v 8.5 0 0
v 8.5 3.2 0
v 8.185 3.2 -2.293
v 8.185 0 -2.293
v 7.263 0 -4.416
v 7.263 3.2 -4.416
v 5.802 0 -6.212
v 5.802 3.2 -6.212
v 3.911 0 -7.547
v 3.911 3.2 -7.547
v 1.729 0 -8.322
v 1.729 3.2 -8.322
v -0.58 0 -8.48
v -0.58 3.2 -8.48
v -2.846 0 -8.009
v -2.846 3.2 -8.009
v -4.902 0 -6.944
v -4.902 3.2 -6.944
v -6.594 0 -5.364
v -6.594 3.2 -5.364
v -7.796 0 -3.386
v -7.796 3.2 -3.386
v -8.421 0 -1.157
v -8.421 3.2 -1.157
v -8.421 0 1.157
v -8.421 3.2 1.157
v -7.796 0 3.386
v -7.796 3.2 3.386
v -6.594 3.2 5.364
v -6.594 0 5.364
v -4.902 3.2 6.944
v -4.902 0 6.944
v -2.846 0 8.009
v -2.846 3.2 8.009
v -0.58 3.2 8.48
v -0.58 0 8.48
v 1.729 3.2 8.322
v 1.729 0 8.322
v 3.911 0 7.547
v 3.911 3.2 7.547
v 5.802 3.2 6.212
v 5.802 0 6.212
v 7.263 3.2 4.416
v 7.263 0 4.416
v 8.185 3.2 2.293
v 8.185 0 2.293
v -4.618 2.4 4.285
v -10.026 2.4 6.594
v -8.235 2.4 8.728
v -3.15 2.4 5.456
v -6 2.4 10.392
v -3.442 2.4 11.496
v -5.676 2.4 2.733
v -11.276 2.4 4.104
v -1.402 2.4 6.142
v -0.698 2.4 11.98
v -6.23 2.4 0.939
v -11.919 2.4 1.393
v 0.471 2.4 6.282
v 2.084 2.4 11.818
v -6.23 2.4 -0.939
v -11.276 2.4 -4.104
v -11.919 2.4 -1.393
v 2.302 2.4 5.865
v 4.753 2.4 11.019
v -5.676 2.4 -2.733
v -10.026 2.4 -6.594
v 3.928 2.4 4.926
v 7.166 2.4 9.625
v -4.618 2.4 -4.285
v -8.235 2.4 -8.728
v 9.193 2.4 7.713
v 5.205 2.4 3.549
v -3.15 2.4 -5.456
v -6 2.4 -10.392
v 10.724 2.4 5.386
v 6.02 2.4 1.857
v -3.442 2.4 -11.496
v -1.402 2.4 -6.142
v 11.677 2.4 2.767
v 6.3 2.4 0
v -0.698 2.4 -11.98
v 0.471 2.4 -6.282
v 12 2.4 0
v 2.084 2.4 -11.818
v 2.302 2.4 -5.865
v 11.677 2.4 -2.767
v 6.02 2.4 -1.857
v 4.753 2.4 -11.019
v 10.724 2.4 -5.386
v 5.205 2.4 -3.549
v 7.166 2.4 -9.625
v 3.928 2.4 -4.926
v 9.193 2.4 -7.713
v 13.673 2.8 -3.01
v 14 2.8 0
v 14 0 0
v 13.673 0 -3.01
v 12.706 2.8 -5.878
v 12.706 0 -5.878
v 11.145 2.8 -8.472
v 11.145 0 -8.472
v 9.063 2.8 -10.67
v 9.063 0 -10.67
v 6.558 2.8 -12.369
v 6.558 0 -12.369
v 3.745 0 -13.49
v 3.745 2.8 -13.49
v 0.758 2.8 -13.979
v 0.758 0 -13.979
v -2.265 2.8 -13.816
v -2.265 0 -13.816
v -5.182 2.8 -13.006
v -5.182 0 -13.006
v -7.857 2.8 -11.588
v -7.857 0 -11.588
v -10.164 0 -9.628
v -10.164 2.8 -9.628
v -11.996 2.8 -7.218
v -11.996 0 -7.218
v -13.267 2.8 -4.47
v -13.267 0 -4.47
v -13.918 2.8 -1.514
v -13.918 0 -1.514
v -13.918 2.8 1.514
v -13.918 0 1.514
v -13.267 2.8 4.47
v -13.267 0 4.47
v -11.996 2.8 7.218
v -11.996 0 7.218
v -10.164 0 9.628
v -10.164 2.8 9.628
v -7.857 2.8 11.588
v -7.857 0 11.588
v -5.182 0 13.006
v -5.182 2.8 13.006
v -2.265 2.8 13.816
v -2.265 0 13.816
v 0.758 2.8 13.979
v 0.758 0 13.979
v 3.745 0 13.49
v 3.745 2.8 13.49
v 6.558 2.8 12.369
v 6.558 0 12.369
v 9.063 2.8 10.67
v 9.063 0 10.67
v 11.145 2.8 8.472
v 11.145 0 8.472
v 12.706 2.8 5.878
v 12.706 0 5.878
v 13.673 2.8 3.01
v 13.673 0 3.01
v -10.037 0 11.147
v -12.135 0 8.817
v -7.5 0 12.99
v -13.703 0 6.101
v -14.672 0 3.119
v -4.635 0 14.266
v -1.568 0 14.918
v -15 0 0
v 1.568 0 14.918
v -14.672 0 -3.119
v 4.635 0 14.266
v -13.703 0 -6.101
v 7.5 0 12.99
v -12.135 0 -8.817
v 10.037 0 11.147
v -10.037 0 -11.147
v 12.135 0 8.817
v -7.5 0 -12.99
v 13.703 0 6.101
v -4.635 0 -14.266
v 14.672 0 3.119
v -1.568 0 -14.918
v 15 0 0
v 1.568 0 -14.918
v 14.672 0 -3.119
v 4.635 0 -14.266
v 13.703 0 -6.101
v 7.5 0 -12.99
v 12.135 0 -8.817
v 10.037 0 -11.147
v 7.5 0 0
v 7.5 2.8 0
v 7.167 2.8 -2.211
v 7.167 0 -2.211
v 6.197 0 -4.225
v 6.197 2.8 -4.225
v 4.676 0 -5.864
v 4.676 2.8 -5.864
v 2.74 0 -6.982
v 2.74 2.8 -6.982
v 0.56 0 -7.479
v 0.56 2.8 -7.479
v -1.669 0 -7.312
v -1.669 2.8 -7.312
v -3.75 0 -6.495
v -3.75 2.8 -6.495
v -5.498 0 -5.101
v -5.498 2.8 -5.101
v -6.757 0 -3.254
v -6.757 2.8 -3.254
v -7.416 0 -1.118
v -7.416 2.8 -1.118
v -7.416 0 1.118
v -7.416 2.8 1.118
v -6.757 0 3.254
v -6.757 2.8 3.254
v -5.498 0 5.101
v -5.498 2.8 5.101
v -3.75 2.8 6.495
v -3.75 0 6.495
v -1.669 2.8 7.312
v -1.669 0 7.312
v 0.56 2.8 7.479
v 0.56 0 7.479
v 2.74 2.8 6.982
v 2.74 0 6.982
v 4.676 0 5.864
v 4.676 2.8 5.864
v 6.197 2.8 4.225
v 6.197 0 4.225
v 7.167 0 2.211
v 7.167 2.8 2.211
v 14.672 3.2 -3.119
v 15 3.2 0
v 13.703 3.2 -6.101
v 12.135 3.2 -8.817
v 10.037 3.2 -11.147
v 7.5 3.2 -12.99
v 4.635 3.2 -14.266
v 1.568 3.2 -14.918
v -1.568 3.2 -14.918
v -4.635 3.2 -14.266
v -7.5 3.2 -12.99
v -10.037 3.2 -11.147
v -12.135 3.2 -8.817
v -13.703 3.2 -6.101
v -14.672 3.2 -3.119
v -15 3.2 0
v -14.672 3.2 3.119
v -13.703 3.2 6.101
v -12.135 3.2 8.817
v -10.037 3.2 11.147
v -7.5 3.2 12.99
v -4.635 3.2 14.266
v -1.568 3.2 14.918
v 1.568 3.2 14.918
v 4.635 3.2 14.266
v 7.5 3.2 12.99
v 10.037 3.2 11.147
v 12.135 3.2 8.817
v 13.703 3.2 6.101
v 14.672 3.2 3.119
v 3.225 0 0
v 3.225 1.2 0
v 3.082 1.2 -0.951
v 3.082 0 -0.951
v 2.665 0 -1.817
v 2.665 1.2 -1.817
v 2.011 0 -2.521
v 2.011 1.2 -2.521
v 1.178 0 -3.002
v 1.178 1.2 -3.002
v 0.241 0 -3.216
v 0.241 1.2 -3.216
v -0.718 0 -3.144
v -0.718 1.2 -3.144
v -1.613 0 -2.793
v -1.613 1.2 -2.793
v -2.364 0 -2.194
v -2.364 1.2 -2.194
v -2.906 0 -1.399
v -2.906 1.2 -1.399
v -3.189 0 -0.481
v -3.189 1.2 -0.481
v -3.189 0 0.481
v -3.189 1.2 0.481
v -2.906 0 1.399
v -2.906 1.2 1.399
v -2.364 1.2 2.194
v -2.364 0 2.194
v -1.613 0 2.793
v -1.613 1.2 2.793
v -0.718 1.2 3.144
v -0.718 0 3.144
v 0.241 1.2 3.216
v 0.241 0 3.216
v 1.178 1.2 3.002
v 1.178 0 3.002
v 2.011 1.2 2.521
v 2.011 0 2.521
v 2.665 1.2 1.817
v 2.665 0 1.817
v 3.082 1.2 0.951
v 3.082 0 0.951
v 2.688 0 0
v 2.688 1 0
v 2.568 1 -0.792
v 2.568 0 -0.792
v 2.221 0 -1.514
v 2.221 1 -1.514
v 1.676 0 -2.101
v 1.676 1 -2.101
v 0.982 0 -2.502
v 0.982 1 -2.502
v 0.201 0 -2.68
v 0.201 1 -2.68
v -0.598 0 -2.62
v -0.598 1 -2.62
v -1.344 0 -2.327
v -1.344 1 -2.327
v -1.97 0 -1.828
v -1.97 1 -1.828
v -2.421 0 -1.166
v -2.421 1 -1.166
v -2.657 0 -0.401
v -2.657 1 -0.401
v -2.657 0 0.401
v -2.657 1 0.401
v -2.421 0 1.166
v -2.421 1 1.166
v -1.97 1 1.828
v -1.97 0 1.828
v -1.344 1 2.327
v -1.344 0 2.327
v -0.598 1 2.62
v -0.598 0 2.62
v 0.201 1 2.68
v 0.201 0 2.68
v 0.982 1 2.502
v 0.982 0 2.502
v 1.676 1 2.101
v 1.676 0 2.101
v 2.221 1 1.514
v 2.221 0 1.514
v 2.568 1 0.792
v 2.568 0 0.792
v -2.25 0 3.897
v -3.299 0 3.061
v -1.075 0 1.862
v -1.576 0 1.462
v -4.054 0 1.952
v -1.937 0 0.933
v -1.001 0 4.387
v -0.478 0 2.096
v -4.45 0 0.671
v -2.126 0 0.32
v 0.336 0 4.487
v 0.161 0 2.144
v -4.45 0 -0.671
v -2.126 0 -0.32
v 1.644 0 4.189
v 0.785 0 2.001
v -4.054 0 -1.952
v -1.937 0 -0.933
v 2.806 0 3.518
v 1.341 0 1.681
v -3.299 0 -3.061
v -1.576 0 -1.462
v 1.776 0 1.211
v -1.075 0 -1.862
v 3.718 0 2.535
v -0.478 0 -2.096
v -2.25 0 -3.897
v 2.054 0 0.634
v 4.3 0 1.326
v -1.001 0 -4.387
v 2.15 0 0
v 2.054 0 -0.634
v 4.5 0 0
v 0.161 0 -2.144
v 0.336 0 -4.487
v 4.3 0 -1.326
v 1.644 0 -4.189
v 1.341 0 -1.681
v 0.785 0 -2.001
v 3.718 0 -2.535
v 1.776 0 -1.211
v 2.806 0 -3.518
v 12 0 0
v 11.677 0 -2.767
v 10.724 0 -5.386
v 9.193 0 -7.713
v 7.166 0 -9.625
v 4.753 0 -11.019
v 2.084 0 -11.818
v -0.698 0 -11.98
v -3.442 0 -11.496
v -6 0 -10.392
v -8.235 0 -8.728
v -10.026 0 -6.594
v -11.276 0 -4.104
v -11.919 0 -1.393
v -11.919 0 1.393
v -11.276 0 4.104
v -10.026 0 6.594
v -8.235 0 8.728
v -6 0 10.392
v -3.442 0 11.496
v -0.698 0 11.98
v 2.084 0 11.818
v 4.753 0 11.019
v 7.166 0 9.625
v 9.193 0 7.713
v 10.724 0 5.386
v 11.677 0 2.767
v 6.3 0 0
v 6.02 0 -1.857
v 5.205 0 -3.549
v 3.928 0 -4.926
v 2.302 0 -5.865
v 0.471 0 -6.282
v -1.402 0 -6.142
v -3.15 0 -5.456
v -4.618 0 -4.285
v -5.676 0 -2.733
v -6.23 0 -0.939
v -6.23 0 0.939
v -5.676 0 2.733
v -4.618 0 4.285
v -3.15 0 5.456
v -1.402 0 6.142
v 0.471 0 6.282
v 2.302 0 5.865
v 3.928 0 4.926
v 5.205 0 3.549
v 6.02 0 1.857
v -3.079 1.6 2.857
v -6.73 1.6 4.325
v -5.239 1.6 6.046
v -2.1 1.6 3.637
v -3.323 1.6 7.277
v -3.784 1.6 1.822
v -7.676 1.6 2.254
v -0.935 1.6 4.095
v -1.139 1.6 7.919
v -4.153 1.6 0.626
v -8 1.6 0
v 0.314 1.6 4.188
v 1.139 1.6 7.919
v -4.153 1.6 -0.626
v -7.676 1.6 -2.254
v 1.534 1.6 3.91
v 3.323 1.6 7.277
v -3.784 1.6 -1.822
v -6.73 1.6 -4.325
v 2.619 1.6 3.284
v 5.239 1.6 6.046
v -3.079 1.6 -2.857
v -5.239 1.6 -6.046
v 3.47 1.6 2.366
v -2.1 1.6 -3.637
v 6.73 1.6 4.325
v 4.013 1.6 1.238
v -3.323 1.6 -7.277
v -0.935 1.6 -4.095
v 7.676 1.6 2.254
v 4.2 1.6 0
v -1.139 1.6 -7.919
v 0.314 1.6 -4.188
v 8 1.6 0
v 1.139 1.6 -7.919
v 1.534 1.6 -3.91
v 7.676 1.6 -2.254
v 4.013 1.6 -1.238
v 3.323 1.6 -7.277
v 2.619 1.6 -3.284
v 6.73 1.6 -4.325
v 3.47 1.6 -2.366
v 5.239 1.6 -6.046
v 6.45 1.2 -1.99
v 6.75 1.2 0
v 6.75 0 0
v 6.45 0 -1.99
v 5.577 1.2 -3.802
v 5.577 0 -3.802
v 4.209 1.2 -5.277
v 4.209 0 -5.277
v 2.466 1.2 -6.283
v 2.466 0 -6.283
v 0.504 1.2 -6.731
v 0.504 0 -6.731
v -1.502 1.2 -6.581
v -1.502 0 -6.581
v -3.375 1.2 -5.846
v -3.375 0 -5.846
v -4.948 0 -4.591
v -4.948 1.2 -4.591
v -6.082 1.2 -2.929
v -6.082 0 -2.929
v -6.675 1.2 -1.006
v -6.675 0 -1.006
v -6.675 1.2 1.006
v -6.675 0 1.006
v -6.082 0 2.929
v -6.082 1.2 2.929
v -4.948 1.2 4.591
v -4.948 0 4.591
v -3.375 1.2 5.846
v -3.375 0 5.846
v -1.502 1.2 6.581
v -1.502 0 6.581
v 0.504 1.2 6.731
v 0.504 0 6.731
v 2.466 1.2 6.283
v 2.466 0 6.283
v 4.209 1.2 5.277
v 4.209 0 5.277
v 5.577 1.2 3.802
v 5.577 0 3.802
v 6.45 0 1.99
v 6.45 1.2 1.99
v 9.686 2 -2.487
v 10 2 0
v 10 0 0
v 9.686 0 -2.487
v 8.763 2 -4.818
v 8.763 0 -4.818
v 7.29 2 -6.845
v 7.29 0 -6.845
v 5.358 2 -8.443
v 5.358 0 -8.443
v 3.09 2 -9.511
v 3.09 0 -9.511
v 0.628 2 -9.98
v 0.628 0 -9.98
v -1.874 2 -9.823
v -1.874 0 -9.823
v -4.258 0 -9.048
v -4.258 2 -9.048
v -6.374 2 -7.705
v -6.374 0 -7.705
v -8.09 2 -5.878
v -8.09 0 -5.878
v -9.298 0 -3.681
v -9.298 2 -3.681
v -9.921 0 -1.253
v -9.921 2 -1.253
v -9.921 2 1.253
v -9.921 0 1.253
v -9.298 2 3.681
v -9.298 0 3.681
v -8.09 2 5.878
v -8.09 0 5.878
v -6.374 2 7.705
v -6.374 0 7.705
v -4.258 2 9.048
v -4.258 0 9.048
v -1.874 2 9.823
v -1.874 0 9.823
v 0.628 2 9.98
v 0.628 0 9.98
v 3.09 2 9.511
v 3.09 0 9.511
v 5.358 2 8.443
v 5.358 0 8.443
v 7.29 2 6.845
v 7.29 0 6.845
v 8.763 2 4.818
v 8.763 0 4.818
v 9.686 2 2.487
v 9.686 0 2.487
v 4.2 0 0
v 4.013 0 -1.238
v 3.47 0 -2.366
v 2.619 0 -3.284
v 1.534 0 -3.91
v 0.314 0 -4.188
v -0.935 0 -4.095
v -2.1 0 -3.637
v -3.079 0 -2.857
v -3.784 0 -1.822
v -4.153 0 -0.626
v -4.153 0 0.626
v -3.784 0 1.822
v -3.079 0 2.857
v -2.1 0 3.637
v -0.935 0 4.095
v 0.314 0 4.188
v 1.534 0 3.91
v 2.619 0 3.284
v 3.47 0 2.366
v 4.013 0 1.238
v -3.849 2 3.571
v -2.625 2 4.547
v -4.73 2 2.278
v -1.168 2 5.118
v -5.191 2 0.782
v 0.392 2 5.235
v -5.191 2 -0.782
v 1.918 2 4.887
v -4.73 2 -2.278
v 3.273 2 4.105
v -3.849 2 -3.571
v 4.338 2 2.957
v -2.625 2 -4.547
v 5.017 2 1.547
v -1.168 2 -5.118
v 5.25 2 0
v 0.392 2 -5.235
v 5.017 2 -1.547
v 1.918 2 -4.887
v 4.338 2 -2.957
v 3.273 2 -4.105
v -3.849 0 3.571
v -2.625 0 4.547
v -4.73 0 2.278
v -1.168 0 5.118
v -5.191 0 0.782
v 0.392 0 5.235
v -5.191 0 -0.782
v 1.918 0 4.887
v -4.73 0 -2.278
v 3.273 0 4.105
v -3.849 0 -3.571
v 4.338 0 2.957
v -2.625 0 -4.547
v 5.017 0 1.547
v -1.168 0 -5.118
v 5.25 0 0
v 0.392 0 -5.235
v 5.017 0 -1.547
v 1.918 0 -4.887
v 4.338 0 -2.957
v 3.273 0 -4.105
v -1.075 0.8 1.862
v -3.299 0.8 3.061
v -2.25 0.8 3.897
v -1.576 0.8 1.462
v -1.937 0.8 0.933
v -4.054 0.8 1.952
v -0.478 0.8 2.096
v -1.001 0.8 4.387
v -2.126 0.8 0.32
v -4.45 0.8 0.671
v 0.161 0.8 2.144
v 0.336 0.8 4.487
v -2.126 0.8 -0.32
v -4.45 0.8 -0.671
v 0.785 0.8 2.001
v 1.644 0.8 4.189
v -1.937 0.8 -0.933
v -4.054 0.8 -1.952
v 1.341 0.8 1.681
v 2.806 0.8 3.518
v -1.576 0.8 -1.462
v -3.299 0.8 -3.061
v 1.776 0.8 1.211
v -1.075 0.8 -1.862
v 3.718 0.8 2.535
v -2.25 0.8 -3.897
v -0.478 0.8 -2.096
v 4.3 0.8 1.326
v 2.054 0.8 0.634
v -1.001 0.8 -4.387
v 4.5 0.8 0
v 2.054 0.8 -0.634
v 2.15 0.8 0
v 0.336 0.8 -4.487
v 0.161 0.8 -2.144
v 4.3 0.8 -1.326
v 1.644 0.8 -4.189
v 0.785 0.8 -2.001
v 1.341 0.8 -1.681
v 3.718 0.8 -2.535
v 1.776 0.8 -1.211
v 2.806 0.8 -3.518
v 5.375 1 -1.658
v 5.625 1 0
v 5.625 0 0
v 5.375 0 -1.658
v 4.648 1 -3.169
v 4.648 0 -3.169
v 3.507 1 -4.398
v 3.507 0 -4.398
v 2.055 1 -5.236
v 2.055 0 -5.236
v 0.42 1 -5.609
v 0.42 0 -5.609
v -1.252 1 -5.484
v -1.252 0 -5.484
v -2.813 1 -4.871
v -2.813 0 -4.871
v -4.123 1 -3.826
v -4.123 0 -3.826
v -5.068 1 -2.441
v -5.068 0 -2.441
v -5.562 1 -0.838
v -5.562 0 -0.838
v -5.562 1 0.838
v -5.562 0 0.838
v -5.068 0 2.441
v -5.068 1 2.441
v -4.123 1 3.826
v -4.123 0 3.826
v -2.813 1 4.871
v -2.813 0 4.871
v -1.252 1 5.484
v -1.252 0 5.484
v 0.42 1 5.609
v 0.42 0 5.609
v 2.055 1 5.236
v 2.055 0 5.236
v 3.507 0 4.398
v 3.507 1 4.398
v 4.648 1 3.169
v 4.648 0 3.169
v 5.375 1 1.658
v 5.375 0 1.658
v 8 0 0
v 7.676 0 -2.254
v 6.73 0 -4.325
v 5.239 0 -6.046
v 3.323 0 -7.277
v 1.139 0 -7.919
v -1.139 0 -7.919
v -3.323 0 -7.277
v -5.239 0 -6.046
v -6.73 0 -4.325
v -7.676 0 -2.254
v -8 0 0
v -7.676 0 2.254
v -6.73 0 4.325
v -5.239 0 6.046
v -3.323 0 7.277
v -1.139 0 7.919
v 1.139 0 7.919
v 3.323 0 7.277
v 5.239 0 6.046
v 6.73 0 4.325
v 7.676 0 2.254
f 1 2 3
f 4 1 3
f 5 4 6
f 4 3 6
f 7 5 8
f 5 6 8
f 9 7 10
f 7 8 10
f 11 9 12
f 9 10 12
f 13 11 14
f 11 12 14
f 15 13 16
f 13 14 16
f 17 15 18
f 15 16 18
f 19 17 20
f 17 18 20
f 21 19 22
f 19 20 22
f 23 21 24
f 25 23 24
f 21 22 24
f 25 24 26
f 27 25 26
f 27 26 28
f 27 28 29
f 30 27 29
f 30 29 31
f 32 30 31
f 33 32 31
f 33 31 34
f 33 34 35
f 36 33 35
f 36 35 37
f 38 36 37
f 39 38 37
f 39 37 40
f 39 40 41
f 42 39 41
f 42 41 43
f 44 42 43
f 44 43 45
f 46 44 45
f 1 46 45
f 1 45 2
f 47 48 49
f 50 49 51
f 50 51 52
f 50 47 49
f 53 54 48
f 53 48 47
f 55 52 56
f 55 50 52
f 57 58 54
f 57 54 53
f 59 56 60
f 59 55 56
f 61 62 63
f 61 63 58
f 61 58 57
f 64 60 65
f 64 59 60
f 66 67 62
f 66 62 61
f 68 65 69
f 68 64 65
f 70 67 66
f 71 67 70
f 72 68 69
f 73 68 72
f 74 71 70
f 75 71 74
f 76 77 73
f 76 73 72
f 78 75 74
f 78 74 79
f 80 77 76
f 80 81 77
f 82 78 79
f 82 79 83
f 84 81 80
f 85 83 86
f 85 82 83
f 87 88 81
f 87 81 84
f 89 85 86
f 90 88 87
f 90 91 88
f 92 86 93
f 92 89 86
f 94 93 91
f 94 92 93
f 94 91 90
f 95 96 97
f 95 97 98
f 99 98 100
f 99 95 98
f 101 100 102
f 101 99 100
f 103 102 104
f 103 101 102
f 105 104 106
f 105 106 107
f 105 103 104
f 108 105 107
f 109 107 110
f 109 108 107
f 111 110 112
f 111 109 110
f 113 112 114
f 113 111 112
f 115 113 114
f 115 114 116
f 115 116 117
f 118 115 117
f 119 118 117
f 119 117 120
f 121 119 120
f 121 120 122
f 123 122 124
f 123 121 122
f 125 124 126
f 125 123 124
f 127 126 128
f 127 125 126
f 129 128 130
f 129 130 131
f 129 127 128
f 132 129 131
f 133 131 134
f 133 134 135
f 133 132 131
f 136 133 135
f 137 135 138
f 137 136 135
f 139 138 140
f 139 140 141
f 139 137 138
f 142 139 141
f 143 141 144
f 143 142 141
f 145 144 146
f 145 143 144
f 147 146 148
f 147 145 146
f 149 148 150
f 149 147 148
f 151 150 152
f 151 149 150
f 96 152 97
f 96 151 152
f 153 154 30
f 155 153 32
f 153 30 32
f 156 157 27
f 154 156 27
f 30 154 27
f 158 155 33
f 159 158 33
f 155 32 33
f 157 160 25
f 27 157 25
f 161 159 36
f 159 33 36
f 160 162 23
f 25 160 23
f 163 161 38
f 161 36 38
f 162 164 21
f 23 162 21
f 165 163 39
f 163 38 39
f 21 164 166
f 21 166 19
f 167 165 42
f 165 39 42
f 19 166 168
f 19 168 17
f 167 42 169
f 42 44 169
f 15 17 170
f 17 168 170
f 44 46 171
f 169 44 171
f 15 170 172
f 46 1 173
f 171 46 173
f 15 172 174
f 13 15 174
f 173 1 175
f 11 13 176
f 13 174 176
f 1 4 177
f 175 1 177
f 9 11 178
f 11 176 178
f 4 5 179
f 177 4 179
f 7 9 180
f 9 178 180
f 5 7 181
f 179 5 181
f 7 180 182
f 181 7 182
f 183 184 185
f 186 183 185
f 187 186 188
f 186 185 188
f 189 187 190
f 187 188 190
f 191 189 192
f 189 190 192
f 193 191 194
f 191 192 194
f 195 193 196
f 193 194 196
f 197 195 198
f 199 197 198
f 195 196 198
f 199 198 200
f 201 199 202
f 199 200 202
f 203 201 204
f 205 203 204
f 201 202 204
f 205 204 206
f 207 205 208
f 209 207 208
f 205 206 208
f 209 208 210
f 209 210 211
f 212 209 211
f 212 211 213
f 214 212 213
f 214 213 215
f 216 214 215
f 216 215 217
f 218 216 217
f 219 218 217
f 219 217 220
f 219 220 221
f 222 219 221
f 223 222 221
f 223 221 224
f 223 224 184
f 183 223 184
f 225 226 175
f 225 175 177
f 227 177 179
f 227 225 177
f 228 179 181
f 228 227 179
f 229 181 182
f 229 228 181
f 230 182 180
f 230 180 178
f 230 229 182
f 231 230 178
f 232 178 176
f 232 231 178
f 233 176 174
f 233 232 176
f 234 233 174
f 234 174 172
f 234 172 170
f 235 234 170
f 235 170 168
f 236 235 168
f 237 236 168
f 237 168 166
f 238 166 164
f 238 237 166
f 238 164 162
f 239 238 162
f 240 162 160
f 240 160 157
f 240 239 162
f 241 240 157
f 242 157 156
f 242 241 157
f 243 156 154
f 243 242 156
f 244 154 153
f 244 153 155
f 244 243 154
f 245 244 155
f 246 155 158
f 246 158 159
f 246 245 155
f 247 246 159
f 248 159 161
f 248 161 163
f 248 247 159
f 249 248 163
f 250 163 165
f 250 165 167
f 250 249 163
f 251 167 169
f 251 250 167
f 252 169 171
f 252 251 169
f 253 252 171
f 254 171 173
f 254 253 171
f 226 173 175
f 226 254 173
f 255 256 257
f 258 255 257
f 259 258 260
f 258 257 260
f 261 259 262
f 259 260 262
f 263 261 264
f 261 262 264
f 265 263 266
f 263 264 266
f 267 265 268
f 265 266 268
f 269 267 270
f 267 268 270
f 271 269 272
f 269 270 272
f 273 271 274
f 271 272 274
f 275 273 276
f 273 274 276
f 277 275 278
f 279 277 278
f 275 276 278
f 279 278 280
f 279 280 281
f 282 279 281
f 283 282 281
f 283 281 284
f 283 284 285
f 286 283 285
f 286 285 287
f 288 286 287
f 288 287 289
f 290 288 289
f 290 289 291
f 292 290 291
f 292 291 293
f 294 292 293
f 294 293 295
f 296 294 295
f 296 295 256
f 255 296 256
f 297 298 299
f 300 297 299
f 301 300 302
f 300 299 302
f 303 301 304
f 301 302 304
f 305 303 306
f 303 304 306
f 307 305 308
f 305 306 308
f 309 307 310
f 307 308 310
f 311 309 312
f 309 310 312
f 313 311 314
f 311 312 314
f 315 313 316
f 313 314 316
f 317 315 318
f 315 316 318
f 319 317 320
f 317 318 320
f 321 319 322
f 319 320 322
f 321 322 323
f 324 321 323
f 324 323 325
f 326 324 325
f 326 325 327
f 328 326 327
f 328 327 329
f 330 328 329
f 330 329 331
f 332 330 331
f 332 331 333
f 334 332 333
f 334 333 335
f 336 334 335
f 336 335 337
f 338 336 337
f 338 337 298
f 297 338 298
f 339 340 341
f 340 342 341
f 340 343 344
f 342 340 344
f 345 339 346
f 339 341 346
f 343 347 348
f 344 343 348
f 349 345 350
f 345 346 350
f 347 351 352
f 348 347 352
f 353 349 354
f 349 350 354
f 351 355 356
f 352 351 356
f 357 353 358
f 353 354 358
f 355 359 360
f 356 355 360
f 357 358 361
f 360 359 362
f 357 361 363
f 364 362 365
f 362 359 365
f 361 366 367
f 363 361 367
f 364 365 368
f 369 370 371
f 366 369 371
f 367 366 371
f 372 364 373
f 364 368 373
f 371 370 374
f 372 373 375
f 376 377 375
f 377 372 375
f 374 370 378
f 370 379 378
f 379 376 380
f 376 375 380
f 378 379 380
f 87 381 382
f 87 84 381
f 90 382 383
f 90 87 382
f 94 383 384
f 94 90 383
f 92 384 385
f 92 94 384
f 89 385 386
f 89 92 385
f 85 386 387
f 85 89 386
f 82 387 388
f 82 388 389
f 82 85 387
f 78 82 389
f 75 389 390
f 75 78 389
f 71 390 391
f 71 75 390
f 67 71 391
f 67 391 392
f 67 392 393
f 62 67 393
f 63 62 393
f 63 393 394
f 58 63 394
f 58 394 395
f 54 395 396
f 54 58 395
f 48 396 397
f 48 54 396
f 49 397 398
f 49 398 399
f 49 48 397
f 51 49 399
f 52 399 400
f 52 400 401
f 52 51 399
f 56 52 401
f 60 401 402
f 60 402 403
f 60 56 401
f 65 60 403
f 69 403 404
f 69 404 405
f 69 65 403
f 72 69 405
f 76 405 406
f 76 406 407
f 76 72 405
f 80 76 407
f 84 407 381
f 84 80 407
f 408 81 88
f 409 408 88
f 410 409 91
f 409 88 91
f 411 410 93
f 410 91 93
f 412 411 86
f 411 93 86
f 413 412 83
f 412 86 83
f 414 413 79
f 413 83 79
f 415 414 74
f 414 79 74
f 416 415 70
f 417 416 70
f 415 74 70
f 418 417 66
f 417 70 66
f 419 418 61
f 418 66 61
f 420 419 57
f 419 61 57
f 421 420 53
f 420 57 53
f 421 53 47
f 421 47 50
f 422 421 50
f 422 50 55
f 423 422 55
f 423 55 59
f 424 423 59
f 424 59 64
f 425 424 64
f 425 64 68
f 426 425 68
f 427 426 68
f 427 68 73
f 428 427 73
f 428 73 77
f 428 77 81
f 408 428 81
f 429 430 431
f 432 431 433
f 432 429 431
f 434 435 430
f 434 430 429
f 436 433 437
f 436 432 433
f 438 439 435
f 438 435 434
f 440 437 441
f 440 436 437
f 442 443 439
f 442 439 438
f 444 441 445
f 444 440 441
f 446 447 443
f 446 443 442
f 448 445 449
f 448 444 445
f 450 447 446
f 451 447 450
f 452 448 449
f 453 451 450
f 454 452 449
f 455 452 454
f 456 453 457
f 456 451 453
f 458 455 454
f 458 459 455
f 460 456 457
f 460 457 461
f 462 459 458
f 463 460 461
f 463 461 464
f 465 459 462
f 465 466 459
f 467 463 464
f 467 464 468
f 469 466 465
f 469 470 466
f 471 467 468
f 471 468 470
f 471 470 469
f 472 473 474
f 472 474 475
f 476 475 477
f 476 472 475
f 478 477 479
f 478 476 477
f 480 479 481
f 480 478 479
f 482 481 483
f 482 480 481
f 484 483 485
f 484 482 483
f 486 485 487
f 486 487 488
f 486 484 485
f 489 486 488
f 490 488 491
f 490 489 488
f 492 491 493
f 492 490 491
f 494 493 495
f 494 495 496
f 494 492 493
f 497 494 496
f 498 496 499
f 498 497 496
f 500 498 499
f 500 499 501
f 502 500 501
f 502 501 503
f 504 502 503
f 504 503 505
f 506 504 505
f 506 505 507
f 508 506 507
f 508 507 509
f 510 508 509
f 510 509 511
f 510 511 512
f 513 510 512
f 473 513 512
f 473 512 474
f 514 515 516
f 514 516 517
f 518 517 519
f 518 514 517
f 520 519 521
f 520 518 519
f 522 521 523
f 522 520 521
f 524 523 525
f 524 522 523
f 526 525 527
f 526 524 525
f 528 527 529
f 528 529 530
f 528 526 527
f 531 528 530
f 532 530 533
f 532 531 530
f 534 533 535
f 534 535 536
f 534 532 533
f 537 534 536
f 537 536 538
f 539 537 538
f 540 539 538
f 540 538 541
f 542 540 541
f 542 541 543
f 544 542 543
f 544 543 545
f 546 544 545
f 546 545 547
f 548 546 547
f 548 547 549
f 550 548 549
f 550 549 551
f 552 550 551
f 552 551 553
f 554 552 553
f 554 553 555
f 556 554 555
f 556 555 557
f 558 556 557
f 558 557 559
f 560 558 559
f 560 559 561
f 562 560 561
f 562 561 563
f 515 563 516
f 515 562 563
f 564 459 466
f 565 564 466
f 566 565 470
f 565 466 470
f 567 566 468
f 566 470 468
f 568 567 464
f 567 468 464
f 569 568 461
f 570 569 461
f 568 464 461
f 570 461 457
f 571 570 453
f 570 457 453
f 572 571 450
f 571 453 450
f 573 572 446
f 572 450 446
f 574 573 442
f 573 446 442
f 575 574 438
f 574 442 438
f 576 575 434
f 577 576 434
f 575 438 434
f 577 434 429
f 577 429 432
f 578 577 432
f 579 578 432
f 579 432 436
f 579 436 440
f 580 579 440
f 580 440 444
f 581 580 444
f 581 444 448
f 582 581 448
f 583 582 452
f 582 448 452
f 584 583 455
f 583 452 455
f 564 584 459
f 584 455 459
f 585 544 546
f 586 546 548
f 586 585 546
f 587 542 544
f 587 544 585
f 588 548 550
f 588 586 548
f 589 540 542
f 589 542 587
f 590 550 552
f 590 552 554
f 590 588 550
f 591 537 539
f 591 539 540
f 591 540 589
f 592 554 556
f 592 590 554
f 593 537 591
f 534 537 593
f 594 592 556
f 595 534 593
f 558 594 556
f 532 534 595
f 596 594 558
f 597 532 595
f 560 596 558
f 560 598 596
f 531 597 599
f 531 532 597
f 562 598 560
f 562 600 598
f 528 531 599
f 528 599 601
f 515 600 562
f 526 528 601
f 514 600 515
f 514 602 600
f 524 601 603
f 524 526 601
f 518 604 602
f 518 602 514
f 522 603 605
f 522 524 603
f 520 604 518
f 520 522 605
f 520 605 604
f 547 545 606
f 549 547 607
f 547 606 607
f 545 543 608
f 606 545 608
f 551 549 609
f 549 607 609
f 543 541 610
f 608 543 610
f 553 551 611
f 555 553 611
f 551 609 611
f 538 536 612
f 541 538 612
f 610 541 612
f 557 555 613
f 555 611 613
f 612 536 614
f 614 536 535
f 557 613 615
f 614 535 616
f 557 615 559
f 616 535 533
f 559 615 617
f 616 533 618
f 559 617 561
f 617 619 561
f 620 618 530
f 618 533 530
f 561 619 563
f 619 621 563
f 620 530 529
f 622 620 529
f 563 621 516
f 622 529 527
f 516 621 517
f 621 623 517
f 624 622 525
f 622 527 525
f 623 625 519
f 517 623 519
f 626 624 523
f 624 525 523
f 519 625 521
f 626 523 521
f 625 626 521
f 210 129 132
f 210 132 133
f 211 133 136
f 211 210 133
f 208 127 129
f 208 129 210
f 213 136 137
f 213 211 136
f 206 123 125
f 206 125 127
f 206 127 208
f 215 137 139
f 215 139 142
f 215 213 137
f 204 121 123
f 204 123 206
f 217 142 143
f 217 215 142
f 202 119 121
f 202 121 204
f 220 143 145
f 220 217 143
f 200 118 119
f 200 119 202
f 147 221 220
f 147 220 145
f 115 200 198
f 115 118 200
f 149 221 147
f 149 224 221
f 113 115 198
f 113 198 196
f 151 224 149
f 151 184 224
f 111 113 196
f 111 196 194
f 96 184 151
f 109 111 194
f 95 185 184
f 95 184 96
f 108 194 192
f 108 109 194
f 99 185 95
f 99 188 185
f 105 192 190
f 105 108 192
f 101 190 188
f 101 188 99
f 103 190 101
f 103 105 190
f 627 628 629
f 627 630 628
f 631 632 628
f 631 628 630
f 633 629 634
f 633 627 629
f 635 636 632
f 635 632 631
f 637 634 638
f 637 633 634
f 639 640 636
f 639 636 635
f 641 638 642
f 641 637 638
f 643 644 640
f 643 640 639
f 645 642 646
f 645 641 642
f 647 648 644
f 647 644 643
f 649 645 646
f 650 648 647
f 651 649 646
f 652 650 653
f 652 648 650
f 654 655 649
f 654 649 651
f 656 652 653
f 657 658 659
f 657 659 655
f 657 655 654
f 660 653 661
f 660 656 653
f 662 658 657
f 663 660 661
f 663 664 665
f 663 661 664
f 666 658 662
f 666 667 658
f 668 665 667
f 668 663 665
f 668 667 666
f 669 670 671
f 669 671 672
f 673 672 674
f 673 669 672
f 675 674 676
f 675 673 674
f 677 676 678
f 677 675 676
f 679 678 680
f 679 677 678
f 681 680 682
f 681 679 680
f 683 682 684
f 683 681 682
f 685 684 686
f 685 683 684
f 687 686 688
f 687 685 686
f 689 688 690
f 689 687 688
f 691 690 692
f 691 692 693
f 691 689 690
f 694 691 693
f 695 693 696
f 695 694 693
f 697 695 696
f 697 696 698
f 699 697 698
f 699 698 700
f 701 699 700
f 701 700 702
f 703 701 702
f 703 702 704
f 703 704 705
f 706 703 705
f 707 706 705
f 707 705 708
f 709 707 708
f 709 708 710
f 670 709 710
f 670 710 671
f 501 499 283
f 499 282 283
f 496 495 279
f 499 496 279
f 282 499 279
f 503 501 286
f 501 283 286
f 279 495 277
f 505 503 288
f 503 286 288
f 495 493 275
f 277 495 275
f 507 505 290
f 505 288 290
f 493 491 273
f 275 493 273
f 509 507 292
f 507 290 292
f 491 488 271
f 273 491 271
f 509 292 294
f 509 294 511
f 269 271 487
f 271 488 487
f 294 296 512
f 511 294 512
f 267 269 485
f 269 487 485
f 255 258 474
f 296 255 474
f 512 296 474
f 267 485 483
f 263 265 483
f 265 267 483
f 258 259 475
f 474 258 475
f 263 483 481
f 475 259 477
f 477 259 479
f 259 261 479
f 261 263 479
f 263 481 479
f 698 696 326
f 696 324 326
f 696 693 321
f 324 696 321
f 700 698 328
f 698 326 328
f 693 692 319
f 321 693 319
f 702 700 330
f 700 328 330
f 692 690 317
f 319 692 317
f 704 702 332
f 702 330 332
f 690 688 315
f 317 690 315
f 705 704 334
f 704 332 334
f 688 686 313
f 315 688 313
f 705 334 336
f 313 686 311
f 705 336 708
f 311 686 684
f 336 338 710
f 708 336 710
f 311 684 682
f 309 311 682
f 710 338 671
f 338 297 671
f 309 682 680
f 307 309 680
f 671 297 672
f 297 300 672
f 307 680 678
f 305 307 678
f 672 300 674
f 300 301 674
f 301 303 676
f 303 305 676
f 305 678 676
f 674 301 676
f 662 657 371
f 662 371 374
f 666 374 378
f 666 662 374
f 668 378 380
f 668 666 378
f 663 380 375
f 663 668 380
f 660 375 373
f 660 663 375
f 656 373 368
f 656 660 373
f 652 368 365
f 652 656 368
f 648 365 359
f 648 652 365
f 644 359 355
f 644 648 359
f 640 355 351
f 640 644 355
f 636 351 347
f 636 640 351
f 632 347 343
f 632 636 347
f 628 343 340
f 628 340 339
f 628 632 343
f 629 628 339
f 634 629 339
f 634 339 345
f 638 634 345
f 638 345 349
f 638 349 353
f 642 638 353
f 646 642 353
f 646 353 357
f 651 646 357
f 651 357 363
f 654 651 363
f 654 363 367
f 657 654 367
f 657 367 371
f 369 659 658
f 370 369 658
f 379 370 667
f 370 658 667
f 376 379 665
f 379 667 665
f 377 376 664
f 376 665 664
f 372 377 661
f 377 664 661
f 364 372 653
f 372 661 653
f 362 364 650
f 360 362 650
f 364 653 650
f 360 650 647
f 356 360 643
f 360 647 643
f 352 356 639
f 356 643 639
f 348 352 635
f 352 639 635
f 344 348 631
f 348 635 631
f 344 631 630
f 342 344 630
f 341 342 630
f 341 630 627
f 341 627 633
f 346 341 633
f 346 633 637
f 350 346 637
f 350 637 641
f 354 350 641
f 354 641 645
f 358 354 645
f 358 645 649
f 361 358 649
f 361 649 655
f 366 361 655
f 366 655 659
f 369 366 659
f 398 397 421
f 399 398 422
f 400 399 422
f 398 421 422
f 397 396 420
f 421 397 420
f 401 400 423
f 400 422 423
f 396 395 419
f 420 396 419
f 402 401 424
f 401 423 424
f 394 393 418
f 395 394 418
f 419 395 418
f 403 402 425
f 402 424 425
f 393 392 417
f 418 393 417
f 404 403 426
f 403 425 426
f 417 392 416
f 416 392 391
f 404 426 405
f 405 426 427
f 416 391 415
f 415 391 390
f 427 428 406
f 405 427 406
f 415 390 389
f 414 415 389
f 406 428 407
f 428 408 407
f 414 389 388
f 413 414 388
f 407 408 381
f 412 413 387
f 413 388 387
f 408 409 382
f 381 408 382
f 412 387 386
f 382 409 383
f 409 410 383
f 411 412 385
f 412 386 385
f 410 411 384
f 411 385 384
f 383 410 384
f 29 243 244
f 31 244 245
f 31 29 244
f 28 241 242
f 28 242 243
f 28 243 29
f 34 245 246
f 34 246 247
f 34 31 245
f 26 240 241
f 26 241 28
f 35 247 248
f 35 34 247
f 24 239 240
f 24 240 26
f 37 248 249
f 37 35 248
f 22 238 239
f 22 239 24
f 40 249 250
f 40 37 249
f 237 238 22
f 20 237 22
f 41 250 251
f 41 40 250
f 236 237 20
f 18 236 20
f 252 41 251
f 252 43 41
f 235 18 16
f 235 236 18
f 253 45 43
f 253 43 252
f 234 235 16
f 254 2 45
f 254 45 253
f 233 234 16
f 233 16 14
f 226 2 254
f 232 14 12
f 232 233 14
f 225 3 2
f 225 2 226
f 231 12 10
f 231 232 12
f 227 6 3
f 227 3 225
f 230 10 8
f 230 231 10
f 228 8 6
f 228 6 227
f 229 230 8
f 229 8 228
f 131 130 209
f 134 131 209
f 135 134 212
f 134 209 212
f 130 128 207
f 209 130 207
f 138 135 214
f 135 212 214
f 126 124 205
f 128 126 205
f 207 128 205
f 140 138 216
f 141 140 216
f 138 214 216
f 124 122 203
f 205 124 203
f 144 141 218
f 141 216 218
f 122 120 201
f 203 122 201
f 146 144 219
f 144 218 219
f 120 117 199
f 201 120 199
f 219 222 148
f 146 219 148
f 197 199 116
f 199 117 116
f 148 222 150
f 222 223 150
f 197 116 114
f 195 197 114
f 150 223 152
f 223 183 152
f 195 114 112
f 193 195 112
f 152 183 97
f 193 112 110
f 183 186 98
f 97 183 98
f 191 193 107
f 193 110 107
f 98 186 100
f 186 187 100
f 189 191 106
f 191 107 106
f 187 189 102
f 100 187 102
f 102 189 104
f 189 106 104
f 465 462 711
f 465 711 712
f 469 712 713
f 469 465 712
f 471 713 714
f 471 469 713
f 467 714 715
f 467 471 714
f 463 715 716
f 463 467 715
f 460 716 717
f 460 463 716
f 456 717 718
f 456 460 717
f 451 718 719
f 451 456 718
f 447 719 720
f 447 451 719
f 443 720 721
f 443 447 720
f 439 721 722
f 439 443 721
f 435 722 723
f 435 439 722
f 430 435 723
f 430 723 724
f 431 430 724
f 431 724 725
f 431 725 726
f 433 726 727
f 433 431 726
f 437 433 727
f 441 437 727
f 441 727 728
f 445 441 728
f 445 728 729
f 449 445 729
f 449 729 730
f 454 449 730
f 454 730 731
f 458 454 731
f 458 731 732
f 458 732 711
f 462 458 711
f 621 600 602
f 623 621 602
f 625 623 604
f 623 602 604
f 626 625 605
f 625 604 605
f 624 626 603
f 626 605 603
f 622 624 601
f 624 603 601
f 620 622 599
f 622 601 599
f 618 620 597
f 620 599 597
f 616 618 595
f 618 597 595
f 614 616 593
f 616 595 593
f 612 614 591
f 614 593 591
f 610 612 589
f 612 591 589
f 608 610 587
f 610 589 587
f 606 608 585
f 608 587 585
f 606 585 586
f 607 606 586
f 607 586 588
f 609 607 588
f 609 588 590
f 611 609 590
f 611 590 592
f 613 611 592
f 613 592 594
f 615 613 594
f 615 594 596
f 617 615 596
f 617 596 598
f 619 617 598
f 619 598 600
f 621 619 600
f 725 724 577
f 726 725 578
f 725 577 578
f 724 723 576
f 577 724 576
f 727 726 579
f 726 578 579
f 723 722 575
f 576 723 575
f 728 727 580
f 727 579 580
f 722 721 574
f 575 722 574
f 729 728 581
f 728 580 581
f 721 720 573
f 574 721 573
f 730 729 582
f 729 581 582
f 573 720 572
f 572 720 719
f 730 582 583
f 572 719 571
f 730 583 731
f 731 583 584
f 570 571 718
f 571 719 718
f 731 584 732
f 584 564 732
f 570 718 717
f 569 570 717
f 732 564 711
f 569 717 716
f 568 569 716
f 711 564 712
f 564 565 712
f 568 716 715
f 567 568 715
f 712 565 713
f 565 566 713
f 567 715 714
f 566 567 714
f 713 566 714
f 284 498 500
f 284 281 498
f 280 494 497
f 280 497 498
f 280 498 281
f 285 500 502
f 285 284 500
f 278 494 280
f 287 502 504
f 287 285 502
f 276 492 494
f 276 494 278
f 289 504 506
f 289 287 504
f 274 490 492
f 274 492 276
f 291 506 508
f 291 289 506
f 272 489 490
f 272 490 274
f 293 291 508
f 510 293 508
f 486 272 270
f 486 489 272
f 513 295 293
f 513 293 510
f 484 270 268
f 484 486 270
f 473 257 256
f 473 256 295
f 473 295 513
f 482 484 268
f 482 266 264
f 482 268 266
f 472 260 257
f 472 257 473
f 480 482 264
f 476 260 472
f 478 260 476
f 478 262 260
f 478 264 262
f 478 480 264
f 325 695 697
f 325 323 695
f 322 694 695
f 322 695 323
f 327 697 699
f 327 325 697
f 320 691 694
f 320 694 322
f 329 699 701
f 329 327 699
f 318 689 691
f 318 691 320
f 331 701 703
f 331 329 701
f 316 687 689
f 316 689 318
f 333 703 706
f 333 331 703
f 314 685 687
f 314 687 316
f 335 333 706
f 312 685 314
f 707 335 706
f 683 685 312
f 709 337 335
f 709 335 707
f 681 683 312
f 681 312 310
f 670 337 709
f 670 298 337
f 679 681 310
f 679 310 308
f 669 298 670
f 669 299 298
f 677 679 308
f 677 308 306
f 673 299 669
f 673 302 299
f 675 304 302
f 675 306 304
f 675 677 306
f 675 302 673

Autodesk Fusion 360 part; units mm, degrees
cylinder "Grundkörper Zylinder2" add diameter 9 height 0.8 placed x (1, 0, 0) y (0, 0, -1) z (0, 1, 0) at (0, 0, 0) makes body 1
cylinder "Grundkörper Zylinder3" cut diameter 4.3 height 1 placed x (1, 0, 0) y (0, 0, -1) z (0, 1, 0) at (0, 0, 0) bodies 1
copy_body "Körper kopieren/einfügen1" bodies 1 makes body 2
copy_body "Körper->Berechn1" bodies 1 removing the originals makes body 3 in component "M4"
scale "Maßstab1" factor 1.25 about (0, 0, 0) bodies 2
copy_body "Körper->Berechn2" bodies 2 removing the originals makes body 4 in component "M5"
copy_body "Körper kopieren/einfügen2" bodies 4 makes body 5
scale "Maßstab2" factor 1.2 about (0, 0, 0) bodies 5
copy_body "Körper->Berechn3" bodies 5 removing the originals makes body 6 in component "M6"
copy_body "Körper kopieren/einfügen4" bodies 3 makes body 7
scale "Maßstab3" factor 2 about (0, 0, 0) bodies 7
move_face "Flächen versetzen1" offset 0.1 1 faces at (4.2786, 1.0667, 0.4281) on bodies 7
move_face "Flächen versetzen2" offset -1 1 faces at (8.9553, 1.0667, 0.8961) on bodies 7
copy_body "Körper kopieren/einfügen5" bodies 7 makes body 8
copy_body "Körper kopieren/einfügen6" bodies 8 makes body 9
copy_body "Körper kopieren/einfügen7" bodies 9 makes body 10
copy_body "Körper kopieren/einfügen8" bodies 10 makes body 11
copy_body "Körper->Berechn4" bodies 7 removing the originals makes body 12 in component "M8"
scale "Maßstab4" factor 1.25 about (0, 0, 0) bodies 8
copy_body "Körper->Berechn5" bodies 8 removing the originals makes body 13 in component "M10"
scale "Maßstab5" factor 1.5 about (0, 0, 0) bodies 9
copy_body "Körper->Berechn6" bodies 9 removing the originals makes body 14 in component "M12"
scale "Maßstab6" factor 1.75 about (0, 0, 0) bodies 10
move_face "Flächen versetzen3" offset -0.15 1 faces at (7.3135, 1.8667, 0.7318) on bodies 10
copy_body "Körper->Berechn7" bodies 10 removing the originals makes body 15 in component "M14"
scale "Maßstab7" factor 2 about (0, 0, 0) bodies 11
move_face "Flächen versetzen4" offset -0.1 1 faces at (8.3583, 2.1333, 0.8364) on bodies 11
move_face "Flächen versetzen5" offset -1 1 faces at (15.9205, 2.1333, 1.5931) on bodies 11
copy_body "Körper->Berechn8" bodies 11 removing the originals makes body 16 in component "M16"
component "M4" placed x (1, 0, 0) y (0, 1, 0) z (0, 0, 1) at (0, 0, 0)
component "M5" placed x (1, 0, 0) y (0, 1, 0) z (0, 0, 1) at (0, 0, 0)
component "M6" placed x (1, 0, 0) y (0, 1, 0) z (0, 0, 1) at (0, 0, 0)
component "M8" placed x (1, 0, 0) y (0, 1, 0) z (0, 0, 1) at (0, 0, 0)
component "M10" placed x (1, 0, 0) y (0, 1, 0) z (0, 0, 1) at (0, 0, 0)
component "M12" placed x (1, 0, 0) y (0, 1, 0) z (0, 0, 1) at (0, 0, 0)
component "M14" placed x (1, 0, 0) y (0, 1, 0) z (0, 0, 1) at (0, 0, 0)
component "M16" placed x (1, 0, 0) y (0, 1, 0) z (0, 0, 1) at (0, 0, 0)
